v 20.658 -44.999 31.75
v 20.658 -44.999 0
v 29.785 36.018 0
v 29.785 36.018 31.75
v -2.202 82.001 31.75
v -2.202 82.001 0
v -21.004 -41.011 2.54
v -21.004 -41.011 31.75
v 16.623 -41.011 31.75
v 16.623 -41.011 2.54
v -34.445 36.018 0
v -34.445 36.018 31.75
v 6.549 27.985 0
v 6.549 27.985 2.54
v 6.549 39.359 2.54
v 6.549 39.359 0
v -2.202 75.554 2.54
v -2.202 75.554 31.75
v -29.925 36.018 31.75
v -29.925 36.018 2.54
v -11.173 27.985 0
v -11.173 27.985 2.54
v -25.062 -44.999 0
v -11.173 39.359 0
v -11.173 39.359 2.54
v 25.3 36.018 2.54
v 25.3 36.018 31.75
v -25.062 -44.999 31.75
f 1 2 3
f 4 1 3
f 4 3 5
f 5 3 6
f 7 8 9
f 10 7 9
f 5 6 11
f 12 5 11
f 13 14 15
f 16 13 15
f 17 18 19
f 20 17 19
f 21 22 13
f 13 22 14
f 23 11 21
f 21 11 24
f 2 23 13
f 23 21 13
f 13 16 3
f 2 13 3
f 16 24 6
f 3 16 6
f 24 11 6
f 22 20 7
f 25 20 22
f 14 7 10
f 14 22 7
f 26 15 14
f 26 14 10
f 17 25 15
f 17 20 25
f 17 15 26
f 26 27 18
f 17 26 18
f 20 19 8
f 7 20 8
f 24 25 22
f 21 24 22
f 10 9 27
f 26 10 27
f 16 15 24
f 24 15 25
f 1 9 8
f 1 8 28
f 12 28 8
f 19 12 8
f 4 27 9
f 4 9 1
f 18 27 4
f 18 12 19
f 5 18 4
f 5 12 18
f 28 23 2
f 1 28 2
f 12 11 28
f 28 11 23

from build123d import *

# Parameters (mm, degrees)
F0_W     = 22.86
F0_H     = 93.98
F1_DEPTH = 31.75
F3_DEPTH = 29.21
F5_DEPTH = 25.4


with BuildPart() as f1:
    # F0 (on Top) → F1 (new body)
    with BuildSketch(Plane.XY):
        Polygon((-25.061955, -44.999161), (-25.061955, 48.980839), (-2.201955, 48.980839), (-2.201955, 82.000839), (-34.44485, 36.017679), align=None)
        with Locations((-13.631955, 1.990839)):
            Rectangle(F0_W, F0_H)
        Polygon((-2.201955, 82.000839), (-2.201955, 48.980839), (20.658045, 48.980839), (20.658045, -44.999161), (29.784556, 36.017679), align=None)
        with Locations((9.228045, 1.990839)):
            Rectangle(F0_W, F0_H)
    extrude(amount=F1_DEPTH)

    # F2 (on face) → F3 (cut)
    with BuildSketch(Plane.XY.offset(31.75)):
        Polygon((25.300306, 36.017679), (-2.201955, 75.554371), (-29.924656, 36.017679), (-21.003638, -41.011075), (16.62305, -41.011075), align=None)
    extrude(amount=-F3_DEPTH, mode=Mode.SUBTRACT)

    # F4 (on face) → F5 (cut)
    with BuildSketch(Plane.XY.offset(2.54)):
        Polygon((6.549126, 39.358769), (-2.201955, 39.358769), (-11.173476, 39.358769), (-11.173476, 27.984561), (6.549126, 27.984561), align=None)
    extrude(amount=-F5_DEPTH, mode=Mode.SUBTRACT)


solid = f1.part
